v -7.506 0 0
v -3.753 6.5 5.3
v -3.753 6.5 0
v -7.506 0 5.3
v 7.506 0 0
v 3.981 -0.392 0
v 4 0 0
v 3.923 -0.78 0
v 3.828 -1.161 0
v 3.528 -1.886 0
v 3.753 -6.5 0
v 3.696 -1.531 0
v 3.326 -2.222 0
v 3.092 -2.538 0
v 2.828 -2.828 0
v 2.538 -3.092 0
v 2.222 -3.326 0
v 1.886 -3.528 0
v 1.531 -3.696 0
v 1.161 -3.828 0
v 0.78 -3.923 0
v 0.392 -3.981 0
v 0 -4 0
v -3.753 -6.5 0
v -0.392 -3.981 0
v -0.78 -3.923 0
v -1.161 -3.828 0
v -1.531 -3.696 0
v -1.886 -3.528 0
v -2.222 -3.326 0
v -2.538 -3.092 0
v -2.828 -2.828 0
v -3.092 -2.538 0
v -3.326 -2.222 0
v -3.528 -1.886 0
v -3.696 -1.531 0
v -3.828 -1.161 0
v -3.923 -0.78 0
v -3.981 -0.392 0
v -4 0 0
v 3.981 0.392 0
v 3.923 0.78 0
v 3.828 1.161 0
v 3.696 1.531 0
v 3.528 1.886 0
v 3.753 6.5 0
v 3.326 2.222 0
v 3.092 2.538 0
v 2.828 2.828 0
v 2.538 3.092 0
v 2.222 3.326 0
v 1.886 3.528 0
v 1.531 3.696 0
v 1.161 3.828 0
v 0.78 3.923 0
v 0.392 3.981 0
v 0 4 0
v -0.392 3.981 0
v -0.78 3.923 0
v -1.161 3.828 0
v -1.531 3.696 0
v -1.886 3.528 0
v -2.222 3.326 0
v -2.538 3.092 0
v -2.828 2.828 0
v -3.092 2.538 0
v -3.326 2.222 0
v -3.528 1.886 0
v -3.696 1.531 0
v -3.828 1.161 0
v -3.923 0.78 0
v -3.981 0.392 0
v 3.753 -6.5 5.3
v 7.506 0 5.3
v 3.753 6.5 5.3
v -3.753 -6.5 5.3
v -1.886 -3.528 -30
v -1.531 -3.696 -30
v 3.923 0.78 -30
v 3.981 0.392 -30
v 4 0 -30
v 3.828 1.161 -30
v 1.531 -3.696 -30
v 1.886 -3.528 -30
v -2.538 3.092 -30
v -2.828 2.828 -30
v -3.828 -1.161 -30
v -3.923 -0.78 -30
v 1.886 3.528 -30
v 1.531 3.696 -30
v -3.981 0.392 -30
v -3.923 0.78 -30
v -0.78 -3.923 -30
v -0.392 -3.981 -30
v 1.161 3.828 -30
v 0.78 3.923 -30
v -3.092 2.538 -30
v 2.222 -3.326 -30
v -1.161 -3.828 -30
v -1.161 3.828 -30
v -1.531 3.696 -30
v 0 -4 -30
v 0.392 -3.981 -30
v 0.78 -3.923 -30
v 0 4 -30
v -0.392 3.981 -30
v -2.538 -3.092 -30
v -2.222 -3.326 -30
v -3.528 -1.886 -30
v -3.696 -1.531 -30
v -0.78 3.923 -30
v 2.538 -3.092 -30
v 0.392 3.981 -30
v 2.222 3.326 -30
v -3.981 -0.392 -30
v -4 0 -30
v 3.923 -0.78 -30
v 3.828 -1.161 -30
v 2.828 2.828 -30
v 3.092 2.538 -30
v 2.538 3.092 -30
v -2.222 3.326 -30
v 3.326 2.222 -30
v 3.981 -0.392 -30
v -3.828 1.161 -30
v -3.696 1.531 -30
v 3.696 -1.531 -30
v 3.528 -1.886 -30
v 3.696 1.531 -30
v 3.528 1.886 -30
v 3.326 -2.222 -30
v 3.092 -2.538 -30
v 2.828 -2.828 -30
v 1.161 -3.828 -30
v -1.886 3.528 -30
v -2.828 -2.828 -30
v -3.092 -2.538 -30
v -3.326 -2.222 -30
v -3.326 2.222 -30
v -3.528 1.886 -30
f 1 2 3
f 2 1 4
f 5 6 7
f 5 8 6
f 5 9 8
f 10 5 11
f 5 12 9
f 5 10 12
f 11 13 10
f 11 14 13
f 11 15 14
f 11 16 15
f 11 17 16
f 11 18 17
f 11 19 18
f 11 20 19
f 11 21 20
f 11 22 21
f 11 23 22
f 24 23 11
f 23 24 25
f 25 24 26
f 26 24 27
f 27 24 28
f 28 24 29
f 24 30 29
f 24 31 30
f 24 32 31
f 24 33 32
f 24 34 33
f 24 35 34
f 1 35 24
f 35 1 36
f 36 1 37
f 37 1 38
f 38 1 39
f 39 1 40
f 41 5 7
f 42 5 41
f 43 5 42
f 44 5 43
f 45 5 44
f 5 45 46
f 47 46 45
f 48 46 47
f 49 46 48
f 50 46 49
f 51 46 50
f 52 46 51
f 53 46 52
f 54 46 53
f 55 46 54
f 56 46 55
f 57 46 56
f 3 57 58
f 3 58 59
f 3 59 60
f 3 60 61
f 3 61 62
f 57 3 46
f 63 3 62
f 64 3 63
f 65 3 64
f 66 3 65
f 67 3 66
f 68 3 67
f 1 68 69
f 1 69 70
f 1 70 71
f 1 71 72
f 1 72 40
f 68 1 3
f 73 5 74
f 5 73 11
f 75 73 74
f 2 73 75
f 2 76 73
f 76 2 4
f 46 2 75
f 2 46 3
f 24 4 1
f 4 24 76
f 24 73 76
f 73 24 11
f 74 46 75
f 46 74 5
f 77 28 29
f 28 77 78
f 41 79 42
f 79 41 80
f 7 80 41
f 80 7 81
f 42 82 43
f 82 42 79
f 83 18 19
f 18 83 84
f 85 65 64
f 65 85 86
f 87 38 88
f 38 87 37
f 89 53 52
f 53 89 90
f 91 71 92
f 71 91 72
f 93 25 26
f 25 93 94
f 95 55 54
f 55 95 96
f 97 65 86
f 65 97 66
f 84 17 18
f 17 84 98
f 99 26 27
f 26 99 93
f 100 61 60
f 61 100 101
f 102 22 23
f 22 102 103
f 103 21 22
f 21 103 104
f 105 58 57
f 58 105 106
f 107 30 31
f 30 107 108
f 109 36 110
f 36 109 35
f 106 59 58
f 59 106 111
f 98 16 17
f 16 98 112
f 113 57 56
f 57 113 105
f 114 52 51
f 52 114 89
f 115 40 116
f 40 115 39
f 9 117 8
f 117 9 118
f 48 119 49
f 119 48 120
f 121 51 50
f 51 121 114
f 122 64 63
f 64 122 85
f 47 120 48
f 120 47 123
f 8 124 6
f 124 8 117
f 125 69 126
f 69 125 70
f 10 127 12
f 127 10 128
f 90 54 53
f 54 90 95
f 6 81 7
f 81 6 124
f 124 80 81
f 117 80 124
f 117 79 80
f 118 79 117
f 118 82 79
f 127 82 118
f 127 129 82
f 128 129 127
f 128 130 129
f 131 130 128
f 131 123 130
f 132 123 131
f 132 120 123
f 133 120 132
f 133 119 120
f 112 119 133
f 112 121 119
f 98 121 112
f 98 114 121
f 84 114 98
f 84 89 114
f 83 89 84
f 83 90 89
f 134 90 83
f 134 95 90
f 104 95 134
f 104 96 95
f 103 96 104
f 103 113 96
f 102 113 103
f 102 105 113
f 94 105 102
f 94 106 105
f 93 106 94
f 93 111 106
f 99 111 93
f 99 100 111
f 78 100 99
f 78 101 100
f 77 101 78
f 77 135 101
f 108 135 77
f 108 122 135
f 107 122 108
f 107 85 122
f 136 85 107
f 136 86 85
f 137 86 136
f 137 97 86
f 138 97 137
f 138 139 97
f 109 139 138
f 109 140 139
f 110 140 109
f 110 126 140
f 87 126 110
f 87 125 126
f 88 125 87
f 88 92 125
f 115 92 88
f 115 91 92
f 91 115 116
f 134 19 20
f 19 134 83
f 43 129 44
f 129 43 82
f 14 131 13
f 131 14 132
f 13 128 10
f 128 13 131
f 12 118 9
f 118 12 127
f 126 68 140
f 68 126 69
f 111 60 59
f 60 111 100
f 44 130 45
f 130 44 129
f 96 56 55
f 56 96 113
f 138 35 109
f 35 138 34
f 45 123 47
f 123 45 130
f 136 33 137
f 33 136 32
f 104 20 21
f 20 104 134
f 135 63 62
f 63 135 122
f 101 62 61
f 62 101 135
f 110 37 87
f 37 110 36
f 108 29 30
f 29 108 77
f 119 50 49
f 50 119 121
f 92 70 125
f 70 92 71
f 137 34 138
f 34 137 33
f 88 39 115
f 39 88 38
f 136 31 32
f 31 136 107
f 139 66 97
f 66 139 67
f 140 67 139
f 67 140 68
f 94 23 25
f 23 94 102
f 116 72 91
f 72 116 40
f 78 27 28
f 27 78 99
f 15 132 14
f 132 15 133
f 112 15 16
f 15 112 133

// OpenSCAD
// M8 六角ボルト（ねじ山省略）
// 頭部底面が z=0、シャンクは z<0 側へ伸びる
r = 13 / sqrt(3); // 六角形の外接円半径（対辺距離13mm に対応）
head_height = 5.3;
shank_d = 8;
shank_h = 30;

union() {
    // 六角頭部（底面 z=0 -> 天面 z=head_height）
    linear_extrude(height = head_height)
        circle(r = r, $fn = 6);

    // シャンク（上面 z=0、下面 z=-shank_h）
    translate([0, 0, -shank_h])
        cylinder(h = shank_h, r = shank_d / 2, $fn = 64);
}
